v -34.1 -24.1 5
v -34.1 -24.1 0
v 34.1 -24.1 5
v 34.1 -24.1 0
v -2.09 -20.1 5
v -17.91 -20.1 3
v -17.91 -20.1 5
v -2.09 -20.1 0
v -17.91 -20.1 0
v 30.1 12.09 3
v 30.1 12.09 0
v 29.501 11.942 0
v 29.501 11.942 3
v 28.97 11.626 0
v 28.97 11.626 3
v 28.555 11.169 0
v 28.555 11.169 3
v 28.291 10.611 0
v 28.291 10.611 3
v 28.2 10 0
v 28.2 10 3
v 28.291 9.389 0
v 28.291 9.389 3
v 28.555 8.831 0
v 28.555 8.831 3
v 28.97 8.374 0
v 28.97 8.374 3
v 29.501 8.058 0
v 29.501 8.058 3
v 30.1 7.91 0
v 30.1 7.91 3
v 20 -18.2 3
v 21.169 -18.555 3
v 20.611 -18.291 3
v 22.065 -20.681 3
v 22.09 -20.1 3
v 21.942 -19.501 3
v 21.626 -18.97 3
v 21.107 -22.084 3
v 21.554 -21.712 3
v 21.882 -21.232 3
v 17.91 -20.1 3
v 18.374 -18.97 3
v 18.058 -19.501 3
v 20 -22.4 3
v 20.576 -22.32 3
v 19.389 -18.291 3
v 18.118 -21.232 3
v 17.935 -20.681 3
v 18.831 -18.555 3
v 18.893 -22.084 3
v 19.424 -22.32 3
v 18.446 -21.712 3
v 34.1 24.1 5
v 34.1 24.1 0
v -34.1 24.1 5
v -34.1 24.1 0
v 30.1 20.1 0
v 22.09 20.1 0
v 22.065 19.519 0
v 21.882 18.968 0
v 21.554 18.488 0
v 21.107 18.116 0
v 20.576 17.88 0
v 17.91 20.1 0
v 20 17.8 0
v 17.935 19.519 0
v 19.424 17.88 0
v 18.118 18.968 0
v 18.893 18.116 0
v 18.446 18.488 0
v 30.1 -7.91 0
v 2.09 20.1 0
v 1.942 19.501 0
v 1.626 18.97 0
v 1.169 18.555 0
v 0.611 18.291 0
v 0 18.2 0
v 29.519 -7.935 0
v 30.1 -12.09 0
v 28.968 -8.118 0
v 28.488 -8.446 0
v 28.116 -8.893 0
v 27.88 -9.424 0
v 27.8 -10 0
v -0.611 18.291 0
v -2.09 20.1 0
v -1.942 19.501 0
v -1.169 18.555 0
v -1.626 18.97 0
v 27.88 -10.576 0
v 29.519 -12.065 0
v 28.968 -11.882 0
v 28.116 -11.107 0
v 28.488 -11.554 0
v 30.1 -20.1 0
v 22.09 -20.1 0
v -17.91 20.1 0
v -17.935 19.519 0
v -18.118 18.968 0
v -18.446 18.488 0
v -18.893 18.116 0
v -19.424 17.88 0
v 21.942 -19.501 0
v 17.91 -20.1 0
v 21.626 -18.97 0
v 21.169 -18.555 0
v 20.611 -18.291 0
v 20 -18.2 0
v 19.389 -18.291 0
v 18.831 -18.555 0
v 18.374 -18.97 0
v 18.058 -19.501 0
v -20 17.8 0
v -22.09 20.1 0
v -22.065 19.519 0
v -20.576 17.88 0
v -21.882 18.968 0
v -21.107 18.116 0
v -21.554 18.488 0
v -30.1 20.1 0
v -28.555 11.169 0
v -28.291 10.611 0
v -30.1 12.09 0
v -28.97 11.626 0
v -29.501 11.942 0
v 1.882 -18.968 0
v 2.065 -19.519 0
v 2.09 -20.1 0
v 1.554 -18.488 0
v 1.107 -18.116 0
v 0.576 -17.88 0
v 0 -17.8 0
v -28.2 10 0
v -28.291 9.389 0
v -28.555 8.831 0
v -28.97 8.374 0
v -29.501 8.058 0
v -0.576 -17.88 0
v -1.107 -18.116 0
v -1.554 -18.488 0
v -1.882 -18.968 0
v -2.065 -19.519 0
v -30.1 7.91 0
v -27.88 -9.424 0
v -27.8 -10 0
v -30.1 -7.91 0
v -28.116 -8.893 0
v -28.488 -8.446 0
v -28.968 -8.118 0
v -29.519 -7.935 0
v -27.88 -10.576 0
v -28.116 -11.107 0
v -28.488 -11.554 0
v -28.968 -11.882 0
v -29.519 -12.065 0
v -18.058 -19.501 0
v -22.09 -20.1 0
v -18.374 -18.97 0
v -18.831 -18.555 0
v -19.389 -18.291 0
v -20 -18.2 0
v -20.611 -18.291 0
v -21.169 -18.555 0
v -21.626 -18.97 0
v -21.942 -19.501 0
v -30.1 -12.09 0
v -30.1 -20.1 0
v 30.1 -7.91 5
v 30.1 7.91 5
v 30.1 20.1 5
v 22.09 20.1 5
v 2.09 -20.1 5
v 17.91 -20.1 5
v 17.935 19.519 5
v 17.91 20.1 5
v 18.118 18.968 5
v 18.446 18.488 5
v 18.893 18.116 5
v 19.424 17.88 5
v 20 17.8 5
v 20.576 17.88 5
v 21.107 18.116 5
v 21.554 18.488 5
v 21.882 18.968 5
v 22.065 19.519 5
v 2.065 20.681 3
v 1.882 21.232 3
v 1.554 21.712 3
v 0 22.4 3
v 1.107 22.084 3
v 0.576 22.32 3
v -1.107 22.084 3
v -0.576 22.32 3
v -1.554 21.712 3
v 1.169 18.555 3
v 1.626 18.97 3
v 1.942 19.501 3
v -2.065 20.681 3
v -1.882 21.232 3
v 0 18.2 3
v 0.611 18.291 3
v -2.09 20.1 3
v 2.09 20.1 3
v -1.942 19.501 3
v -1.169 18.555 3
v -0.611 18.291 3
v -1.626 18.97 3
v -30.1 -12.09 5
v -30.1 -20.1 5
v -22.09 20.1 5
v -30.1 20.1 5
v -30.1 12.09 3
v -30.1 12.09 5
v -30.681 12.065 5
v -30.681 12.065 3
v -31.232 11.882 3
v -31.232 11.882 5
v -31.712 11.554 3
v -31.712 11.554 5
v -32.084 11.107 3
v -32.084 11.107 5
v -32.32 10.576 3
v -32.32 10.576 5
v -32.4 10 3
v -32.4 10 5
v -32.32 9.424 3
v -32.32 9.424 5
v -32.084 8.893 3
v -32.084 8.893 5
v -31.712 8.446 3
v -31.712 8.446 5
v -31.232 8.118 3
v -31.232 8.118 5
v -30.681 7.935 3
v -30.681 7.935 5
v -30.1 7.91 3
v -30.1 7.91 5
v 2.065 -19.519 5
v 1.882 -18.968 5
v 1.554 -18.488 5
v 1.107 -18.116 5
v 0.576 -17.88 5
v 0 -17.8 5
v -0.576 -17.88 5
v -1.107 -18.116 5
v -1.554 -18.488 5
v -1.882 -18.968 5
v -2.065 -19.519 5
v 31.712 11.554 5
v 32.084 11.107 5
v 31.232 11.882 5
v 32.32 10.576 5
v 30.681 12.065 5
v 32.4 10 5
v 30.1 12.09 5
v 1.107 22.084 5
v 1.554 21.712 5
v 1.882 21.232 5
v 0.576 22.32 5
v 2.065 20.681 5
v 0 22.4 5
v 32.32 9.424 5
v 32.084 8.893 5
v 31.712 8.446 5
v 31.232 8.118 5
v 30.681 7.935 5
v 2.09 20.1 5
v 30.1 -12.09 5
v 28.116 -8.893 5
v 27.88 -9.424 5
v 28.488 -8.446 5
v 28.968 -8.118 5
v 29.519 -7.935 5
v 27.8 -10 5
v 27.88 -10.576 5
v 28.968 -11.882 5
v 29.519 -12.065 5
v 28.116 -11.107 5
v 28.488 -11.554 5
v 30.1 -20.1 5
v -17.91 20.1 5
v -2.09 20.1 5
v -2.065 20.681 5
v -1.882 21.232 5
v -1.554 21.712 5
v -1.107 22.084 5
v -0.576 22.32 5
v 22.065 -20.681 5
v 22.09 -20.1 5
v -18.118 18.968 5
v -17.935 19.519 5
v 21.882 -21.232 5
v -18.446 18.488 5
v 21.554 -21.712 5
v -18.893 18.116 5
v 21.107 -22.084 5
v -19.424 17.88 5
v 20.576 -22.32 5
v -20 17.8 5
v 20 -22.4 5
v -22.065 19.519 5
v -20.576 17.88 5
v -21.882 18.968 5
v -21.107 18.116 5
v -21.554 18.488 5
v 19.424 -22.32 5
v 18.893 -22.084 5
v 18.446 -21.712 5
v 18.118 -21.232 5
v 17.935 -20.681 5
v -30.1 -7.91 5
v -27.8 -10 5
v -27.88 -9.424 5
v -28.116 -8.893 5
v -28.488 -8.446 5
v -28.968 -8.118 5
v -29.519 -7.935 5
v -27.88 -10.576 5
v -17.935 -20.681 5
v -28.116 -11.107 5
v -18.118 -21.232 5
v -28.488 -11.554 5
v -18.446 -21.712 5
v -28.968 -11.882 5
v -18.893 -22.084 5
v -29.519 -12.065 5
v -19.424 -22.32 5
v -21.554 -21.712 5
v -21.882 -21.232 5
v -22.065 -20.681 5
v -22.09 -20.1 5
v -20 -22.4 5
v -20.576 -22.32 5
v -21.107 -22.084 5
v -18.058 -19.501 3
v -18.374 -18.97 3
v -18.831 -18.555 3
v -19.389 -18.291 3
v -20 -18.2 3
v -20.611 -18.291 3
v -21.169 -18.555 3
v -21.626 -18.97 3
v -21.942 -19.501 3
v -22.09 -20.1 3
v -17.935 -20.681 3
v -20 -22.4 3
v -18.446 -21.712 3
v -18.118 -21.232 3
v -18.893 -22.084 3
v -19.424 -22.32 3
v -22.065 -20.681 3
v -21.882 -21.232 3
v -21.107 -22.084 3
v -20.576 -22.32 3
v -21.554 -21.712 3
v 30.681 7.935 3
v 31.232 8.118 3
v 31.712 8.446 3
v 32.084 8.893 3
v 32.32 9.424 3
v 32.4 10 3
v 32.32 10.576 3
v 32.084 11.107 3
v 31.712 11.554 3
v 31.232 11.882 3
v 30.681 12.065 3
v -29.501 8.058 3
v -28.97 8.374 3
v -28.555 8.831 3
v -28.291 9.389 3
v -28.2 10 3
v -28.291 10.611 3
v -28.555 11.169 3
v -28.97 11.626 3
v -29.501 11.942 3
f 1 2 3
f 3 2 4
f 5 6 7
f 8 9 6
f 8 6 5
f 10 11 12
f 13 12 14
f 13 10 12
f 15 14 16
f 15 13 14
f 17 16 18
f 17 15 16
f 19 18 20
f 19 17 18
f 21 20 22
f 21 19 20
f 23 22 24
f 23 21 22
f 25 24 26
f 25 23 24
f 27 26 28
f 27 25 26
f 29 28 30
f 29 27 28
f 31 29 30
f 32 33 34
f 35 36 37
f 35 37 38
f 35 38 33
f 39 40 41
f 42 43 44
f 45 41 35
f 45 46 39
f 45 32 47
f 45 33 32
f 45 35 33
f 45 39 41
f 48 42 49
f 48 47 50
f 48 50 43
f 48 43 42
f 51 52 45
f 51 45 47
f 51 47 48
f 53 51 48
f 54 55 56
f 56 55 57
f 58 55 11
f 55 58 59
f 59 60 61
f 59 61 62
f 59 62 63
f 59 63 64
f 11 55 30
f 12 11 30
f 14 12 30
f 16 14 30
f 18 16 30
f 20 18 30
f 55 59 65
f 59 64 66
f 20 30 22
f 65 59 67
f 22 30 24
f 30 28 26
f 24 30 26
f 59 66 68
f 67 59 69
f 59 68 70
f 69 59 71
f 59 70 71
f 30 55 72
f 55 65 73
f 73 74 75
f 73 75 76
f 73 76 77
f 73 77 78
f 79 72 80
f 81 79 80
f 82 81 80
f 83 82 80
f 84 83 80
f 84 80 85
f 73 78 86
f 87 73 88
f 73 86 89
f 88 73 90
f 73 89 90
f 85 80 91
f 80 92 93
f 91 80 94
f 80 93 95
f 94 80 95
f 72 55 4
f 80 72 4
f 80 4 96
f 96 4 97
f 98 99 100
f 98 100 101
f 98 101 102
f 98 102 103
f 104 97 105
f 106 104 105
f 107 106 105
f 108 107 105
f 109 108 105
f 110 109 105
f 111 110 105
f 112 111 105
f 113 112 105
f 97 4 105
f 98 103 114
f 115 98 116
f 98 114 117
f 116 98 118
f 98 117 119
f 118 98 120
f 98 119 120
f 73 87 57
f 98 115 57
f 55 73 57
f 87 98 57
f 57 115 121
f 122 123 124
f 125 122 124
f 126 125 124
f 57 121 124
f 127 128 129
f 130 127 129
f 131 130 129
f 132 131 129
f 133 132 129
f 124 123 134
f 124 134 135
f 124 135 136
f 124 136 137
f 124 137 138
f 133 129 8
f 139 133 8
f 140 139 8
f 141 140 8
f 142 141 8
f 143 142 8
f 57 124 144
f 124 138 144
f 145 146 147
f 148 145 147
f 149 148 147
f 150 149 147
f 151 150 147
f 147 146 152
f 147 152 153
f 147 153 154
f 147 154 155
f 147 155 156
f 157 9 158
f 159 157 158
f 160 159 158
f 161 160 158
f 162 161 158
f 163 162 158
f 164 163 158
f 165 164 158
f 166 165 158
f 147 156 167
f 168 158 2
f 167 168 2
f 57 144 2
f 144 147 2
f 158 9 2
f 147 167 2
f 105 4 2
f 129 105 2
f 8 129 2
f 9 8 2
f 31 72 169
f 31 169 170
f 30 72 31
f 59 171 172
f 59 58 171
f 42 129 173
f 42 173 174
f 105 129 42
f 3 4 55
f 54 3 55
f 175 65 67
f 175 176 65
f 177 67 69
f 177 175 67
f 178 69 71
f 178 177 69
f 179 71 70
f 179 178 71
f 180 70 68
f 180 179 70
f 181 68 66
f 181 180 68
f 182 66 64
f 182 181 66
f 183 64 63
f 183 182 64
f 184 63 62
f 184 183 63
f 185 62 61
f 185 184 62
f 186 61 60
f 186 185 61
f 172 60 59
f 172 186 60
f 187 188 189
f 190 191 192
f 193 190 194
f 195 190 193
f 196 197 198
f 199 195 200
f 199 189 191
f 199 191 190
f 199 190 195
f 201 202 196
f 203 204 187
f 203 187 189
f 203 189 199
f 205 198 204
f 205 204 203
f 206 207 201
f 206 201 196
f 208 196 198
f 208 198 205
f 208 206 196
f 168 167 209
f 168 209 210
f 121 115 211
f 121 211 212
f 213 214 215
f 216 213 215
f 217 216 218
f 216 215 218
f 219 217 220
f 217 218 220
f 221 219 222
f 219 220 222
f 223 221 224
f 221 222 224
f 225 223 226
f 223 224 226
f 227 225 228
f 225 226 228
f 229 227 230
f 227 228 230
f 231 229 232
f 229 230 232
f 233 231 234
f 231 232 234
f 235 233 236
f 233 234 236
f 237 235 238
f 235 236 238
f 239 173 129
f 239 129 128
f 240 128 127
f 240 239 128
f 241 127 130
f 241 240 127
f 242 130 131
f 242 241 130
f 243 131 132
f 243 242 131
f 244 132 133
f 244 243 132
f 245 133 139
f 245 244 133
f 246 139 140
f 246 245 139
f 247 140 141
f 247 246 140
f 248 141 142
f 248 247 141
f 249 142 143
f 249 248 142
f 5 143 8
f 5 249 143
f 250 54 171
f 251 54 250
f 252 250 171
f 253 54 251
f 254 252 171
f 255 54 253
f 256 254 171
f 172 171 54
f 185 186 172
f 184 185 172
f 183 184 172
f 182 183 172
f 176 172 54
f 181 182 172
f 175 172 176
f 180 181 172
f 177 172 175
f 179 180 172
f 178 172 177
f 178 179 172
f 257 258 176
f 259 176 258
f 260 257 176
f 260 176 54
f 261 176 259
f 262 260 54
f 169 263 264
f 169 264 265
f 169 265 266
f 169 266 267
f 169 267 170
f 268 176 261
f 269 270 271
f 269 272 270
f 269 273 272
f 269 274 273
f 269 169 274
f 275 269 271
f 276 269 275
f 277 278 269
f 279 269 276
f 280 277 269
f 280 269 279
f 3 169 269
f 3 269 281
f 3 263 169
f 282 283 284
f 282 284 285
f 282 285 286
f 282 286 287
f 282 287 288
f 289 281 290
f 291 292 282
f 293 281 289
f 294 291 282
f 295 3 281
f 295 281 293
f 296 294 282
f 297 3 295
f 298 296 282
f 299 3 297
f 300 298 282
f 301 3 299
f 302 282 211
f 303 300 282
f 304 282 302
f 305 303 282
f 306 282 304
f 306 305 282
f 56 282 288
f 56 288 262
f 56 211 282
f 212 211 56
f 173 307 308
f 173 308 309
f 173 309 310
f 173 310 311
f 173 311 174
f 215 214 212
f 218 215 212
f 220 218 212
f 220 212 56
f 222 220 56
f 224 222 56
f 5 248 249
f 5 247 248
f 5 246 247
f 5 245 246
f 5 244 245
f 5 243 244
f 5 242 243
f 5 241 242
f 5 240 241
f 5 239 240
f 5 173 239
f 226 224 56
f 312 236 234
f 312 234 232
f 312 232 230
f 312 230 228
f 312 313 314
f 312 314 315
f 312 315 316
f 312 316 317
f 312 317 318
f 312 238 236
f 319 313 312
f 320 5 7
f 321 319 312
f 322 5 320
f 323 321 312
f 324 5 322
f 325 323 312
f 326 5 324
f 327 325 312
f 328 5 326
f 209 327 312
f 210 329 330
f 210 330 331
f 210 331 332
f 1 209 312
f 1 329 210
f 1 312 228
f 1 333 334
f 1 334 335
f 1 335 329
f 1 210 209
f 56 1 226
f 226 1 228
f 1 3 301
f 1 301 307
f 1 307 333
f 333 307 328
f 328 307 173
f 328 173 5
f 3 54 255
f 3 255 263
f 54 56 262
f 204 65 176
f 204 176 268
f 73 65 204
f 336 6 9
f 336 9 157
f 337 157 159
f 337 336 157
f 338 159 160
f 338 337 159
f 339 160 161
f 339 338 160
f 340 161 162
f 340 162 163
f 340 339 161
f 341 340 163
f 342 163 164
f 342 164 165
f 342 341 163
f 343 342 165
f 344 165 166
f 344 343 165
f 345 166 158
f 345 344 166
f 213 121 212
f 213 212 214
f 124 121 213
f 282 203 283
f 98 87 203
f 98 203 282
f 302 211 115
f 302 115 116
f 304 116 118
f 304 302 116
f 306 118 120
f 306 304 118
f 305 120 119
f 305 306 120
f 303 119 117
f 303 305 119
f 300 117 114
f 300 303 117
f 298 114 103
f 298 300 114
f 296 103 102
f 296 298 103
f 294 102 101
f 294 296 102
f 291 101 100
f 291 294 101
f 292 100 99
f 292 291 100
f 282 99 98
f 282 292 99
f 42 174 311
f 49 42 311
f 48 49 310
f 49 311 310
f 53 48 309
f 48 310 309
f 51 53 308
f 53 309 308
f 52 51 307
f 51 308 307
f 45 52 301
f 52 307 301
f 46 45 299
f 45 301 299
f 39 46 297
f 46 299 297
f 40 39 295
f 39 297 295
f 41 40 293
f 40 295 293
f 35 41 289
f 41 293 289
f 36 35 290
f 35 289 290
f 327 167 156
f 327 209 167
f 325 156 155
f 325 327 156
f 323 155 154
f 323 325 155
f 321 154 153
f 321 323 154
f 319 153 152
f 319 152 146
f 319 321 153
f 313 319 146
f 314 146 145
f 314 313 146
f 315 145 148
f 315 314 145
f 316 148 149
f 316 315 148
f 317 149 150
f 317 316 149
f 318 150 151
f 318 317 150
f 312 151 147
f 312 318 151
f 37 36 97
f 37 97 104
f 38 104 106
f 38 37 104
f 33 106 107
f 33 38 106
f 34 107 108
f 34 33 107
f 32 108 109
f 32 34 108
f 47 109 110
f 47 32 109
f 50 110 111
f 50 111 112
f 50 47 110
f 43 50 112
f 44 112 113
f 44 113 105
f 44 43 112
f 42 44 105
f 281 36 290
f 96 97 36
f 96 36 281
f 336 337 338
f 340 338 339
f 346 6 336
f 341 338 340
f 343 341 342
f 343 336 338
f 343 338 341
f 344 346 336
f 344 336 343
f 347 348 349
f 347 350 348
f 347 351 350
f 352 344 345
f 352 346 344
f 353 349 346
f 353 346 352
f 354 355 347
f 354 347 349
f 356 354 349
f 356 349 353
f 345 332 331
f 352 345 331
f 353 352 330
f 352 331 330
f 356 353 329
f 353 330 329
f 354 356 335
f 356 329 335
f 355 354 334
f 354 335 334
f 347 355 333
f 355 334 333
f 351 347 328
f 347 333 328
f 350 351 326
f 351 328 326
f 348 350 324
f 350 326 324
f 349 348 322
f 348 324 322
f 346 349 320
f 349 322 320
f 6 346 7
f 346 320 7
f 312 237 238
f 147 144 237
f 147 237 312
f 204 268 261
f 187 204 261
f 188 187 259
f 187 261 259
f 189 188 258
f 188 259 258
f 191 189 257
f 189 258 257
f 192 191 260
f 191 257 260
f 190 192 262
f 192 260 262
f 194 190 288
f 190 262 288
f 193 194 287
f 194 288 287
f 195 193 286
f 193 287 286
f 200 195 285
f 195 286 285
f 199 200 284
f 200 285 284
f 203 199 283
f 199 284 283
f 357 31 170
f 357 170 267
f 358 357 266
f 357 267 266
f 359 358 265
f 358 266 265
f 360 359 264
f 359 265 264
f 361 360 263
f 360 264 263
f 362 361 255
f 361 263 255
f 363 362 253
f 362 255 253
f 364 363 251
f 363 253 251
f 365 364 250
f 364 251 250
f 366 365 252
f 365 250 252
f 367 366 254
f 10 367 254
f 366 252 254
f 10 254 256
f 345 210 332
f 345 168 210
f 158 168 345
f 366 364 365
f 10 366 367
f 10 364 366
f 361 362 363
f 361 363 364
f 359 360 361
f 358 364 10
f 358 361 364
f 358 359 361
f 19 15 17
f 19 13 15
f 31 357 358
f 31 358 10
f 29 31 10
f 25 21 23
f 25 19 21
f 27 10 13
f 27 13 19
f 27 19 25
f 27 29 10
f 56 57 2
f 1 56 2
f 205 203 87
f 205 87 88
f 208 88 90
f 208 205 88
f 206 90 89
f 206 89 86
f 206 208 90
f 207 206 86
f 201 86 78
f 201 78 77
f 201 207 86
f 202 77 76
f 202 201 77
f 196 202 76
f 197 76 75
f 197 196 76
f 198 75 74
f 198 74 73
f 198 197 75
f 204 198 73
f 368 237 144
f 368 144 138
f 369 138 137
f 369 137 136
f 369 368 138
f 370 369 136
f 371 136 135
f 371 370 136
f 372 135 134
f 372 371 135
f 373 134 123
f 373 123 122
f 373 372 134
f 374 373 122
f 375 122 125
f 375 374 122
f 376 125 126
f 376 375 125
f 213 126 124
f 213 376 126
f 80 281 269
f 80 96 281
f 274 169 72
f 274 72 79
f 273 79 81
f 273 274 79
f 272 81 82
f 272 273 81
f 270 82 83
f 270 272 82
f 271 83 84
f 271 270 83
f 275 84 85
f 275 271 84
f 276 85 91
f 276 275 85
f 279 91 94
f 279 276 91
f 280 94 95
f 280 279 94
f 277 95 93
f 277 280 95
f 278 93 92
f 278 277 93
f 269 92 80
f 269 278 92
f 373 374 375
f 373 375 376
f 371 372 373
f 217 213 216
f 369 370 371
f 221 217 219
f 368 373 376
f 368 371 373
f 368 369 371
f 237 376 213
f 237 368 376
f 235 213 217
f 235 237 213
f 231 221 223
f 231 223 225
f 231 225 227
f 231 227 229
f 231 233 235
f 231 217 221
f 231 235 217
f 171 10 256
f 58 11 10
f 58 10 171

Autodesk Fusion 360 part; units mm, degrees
sketch "Sketch2" plane through (0, 0, 0) normal (0, 0, 1) x (-1, 0, 0)
  line L0 (-34, 24) -> (-34, -24)
  line L1 (-34, -24) -> (34, -24)
  line L2 (34, -24) -> (34, 24)
  line L3 (34, 24) -> (-34, 24)
  line L4 (34.1, 24.1) -> (-34.1, 24.1)
  line L5 (-34.1, 24.1) -> (-34.1, -24.1)
  line L6 (-34.1, -24.1) -> (34.1, -24.1)
  line L7 (34.1, -24.1) -> (34.1, 24.1)
  line L8 (34.1, 24.1) -> (-34.1, -24.1) construction
  line L9 (-34.1, 24.1) -> (34.1, -24.1) construction
  dimension "d5" = 68.2
  dimension "d6" = 48.2
extrude "Extrude2" add sketch "Sketch2" along normal blind 5 contours L0 L1 L2 L3 | L4 L5 L6 L7
shell "Shell1" thickness 4 removed faces 2 at (11.3667, 8.0333, 0) at (11.3667, 8.0333, 5)
sketch "pillar sketch" plane through (0, 0, 5) normal (0, 0, 1) x (-1, 0, 0)
  line L0 (30.1, -20.1) -> (-30.1, -20.1)
  line L1 (-30.1, -20.1) -> (-30.1, 20.1)
  line L2 (-30.1, 20.1) -> (30.1, 20.1)
  line L3 (30.1, 20.1) -> (30.1, -20.1)
  line L4 (34.1, -24.1) -> (34.1, 24.1)
  line L5 (34.1, 24.1) -> (-34.1, 24.1)
  line L6 (-34.1, 24.1) -> (-34.1, -24.1)
  line L7 (-34.1, -24.1) -> (34.1, -24.1)
  circle A0 centre (0, 19.9) radius 2.1
  circle A1 centre (29.9, 10) radius 2.1
  circle A2 centre (-29.9, 10) radius 2.1
  circle A3 centre (20, -19.9) radius 2.1
  circle A4 centre (-20, -19.9) radius 2.1
  dimension "d11" = 4.2
  dimension "d15" = 4.2
  dimension "d18" = 4.2
  dimension "d23" = 0.2
  dimension "d24" = 0.2
  dimension "d25" = 0.2
  dimension "d27" = 4.2
  dimension "d28" = 0.2
  dimension "d29" = 10.1
  dimension "d30" = 10.1
  dimension "d31" = 10.1
  dimension "d32" = 4.2
  dimension "d33" = 0.2
  dimension "d34" = 10.1
extrude "Extrude3" add sketch "pillar sketch" against normal blind 5 contours L0 A3 | L3 A1 | L0 A4 | L2 A0 | L1 A2 picked at (20.5146, -19.3943) picked at (29.3788, 9.752) picked at (-19.3838, -19.1714) picked at (0.6581, 19.0774) picked at (-29.3932, 10.2832)
sketch "hollow sketch A" plane through (0, 0, 5) normal (0, 0, 1) x (-1, 0, 0)
  line L0 (30.1, -20.1) -> (22.0905, -20.1)
  arc A0 (22.0905, -20.1) -> (17.9095, -20.1) centre (20, -19.9) ccw
  line L1 (17.9095, -20.1) -> (-17.9095, -20.1)
  arc A1 (-17.9095, -20.1) -> (-22.0905, -20.1) centre (-20, -19.9) ccw
  line L2 (-22.0905, -20.1) -> (-30.1, -20.1)
  line L3 (-30.1, -20.1) -> (-30.1, 7.9095)
  arc A2 (-30.1, 7.9095) -> (-30.1, 12.0905) centre (-29.9, 10) ccw
  line L4 (-30.1, 12.0905) -> (-30.1, 20.1)
  line L5 (-30.1, 20.1) -> (-2.0905, 20.1)
  arc A3 (-2.0905, 20.1) -> (2.0905, 20.1) centre (0, 19.9) ccw
  line L6 (2.0905, 20.1) -> (30.1, 20.1)
  line L7 (30.1, 20.1) -> (30.1, 12.0905)
  arc A4 (30.1, 12.0905) -> (30.1, 7.9095) centre (29.9, 10) ccw
  line L8 (30.1, 7.9095) -> (30.1, -20.1)
  line L9 (34.1, -24.1) -> (34.1, 24.1)
  line L10 (34.1, 24.1) -> (-34.1, 24.1)
  line L11 (-34.1, 24.1) -> (-34.1, -24.1)
  line L12 (-34.1, -24.1) -> (34.1, -24.1)
  circle A5 centre (20, 20.3) radius 2.1
  circle A6 centre (30.3, -10) radius 2.1
  circle A7 centre (-30.3, -10) radius 2.1
  circle A8 centre (0, -20.3) radius 2.1
  circle A9 centre (-20, 20.3) radius 2.1
  dimension "d37" = 4.2
  dimension "d38" = 4.2
  dimension "d39" = 4.2
  dimension "d40" = 4.2
  dimension "d41" = 4.2
  dimension "d42" = 0.2
  dimension "d44" = 0.2
  dimension "d45" = 10.1
  dimension "d46" = 10.1
  dimension "d47" = 10.1
  dimension "d49" = 10.1
  dimension "d51" = 0.2
extrude "Extrude4" add sketch "hollow sketch A" against normal blind 3 from surface at -2 contours L8 A6 | L1 A8 | L6 A5 | L3 A7 | L5 A9 picked at (29.4743, -9.8971) picked at (-0.2209, -19.3952) picked at (20.5114, 18.7272) picked at (-28.7439, -10.2036) picked at (-20.6202, 19.3298)
extrude "Extrude5" cut sketch "hollow sketch A" against normal blind 2 contours L8 A6 | L1 A8 | L1 A8 | L6 A5 | L6 A5 | L3 A7 | L3 A7 | L5 A9 | L5 A9 picked at (30.8398, -9.8081)
equation "d5 = 68 mm + space_error * 2"
equation "d6 = 48 mm + space_error * 2"
equation "error_hollow = 0.2 mm" comment "das wo e ussparig isch, grechnet vom innere rand"
equation "d11 = diam_pillar"
equation "diam_hollow = 4.2 mm" comment "das wo e ussparig isch, dr durchmesser"
equation "error_pillar = 0.2 mm" comment "das wo ine e sühle isch, grechnet vom innere rand"
equation "diam_pillar = 4.2 mm" comment "das wo ine e sühle isch, dr durchmesser"
equation "d15 = diam_pillar"
equation "d18 = diam_pillar"
equation "d23 = error_pillar"
equation "d24 = error_pillar"
equation "d25 = error_pillar"
equation "d27 = diam_pillar"
equation "d28 = error_pillar"
equation "d29 = 10 mm + space_error"
equation "d30 = 10 mm + space_error"
equation "d31 = 10 mm + space_error"
equation "d32 = diam_pillar"
equation "d33 = error_pillar"
equation "d34 = 10 mm + space_error"
equation "d37 = diam_hollow"
equation "d38 = diam_hollow"
equation "d39 = diam_hollow"
equation "d40 = diam_hollow"
equation "d41 = diam_hollow"
equation "d42 = error_hollow"
equation "d44 = error_hollow"
equation "d45 = 10 mm + space_error"
equation "d46 = 10 mm + space_error"
equation "d47 = 10 mm + space_error"
equation "space_error = 0.1 mm"
equation "d49 = 10 mm + space_error"
equation "d50 = -error_hollow"
equation "d51 = error_hollow"
equation "d66 = -error_hollow"
